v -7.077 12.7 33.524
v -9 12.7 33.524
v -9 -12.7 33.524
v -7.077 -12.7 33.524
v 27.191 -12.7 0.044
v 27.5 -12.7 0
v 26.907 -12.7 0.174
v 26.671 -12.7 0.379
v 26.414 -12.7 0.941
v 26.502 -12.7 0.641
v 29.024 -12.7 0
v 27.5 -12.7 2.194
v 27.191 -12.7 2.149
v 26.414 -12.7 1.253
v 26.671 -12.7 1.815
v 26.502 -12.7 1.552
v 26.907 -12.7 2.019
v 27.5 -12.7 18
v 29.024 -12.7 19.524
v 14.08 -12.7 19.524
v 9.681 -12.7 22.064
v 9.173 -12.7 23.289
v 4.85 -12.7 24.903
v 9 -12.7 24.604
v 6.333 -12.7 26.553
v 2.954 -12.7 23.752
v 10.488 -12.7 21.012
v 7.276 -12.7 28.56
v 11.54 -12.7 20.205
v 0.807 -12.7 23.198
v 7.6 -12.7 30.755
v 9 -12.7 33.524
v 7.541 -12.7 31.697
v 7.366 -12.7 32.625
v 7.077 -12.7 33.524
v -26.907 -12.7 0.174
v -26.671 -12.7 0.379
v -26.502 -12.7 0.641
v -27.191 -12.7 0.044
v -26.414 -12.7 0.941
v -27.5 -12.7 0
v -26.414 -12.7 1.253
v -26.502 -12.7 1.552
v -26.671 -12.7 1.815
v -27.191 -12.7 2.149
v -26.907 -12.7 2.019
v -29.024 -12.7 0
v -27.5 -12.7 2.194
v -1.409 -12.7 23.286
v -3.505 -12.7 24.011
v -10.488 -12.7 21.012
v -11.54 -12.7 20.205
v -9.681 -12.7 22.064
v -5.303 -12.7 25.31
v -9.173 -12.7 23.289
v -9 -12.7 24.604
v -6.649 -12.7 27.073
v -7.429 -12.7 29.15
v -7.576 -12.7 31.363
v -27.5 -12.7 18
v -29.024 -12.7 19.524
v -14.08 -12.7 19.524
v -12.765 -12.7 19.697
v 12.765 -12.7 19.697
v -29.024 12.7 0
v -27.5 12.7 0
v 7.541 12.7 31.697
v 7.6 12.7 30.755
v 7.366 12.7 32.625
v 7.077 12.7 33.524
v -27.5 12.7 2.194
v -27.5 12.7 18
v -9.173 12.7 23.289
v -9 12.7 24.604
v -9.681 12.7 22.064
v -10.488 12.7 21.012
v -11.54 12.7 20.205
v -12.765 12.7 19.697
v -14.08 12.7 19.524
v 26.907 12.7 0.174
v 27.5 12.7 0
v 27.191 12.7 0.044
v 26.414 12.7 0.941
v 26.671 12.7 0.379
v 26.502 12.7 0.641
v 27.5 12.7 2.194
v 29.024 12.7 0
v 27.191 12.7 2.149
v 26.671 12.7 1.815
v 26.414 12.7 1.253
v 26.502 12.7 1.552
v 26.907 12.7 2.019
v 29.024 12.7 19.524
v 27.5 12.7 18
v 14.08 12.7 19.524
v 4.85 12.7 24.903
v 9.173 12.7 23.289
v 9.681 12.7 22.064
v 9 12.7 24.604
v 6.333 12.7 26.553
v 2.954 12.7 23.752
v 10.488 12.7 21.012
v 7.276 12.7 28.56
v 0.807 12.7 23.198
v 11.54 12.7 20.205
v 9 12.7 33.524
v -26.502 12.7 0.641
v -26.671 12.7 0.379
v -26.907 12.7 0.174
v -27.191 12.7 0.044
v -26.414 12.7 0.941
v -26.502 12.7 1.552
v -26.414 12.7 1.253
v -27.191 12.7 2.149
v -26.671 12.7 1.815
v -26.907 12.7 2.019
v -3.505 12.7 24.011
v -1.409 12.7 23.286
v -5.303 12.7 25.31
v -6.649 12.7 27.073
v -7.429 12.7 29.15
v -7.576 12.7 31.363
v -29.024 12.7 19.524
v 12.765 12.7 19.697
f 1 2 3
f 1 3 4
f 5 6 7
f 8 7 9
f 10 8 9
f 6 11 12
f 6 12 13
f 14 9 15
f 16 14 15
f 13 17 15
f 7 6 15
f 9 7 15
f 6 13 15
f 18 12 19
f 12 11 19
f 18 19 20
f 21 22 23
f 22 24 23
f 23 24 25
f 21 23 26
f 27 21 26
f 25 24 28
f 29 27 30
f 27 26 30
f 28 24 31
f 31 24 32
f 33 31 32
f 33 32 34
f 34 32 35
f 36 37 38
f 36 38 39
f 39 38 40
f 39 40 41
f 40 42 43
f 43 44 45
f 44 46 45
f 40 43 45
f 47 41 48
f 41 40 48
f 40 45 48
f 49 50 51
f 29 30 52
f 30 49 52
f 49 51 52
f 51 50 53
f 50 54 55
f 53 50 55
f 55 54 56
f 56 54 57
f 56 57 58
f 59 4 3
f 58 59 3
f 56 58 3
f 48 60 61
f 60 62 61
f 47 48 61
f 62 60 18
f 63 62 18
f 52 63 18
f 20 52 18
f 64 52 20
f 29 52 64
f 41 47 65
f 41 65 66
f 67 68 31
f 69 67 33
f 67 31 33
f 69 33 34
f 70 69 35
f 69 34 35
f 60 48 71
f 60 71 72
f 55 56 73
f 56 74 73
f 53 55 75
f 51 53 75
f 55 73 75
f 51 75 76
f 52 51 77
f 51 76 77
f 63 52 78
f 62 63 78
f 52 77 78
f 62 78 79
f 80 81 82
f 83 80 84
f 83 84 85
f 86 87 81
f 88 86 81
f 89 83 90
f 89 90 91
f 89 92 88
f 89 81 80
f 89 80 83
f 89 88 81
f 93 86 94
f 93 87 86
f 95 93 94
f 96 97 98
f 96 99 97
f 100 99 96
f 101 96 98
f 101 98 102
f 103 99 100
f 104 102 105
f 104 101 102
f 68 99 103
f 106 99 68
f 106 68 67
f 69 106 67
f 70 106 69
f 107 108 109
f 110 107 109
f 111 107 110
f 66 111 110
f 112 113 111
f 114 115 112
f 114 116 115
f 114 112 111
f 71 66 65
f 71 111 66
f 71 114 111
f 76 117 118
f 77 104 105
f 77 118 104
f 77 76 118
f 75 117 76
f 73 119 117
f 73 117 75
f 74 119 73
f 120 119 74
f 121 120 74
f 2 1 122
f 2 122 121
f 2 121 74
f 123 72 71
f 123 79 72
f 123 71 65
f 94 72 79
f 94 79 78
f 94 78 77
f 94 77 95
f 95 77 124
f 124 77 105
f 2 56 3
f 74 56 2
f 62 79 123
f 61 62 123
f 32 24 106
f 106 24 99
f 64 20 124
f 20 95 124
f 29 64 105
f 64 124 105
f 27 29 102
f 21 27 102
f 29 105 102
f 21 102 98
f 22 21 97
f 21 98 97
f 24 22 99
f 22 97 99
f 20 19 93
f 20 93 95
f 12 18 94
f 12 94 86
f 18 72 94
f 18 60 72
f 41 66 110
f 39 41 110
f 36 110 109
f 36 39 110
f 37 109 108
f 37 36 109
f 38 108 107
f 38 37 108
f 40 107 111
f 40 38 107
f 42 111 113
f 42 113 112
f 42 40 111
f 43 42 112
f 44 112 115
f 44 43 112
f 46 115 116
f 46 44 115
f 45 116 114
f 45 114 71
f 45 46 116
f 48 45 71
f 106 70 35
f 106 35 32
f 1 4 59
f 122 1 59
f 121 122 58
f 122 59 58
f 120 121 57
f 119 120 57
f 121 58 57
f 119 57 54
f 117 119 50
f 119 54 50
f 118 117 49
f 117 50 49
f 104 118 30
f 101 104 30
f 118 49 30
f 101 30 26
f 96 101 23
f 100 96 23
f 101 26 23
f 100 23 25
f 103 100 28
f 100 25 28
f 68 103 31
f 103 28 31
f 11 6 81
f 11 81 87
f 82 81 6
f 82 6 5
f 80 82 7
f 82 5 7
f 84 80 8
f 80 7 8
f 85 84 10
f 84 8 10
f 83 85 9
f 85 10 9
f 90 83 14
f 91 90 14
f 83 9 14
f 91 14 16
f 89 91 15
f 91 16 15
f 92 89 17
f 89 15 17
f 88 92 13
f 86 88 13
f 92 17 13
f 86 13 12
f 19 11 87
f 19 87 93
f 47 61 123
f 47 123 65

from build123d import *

# Parameters (mm, degrees)
F1_DEPTH = 12.7
F3_DEPTH = 25.4
F5_W     = 18
F5_H     = 25.4
F6_DEPTH = 14
F8_DEPTH = 25.401
F9_R     = 5.08


with BuildPart() as f1:
    # F0 (on Front) → F1 (new body, symmetric)
    with BuildSketch(Plane.XZ):
        Polygon((27.5, 18), (27.5, 0), (29.024, 0), (29.024, 19.524), (0, 19.524), (-29.024, 19.524), (-29.024, 0), (-27.5, 0), (-27.5, 18), (0, 18), align=None)
    extrude(amount=F1_DEPTH, both=True)

    # F2 (on face) → F3 (join, through all)
    with BuildSketch(Plane.XZ.offset(12.7)):
        with BuildLine():
            Line((-27.5, 2.1935291588), (-27.5, 0))
            ThreePointArc((-27.5, 0), (-26.4032354206, 1.0967645794), (-27.5, 2.1935291588))
        make_face()
    extrude(amount=-F3_DEPTH)

    # F4: F1 across plane


with BuildPart() as f1_1:
    add(f1.part)
    add(f1.part.mirror(Plane.YZ))

    # F5 (on face) → F6 (join)
    with BuildSketch(Plane.XY.offset(19.524)):
        Rectangle(F5_W, F5_H)
    extrude(amount=F6_DEPTH)

    # F7 (on face) → F8 (cut, through all)
    with BuildSketch(Plane.XZ.offset(12.7)):
        with BuildLine():
            ThreePointArc((-7.0774375942, 33.524), (-1.409161858, 23.2863288576), (7.6, 30.7545457035))
            ThreePointArc((7.6, 30.7545457035), (7.4682168459, 32.1637075615), (7.0774375942, 33.524))
            Line((7.0774375942, 33.524), (-7.0774375942, 33.524))
        make_face()
    extrude(amount=-F8_DEPTH, mode=Mode.SUBTRACT)

    # F9
    f9_edges = [f1_1.edges().sort_by_distance(p)[0] for p in [
        (9, 0, 19.524),
        (-9, 0, 19.524),
    ]]
    fillet(f9_edges, radius=F9_R)


solid = f1_1.part
